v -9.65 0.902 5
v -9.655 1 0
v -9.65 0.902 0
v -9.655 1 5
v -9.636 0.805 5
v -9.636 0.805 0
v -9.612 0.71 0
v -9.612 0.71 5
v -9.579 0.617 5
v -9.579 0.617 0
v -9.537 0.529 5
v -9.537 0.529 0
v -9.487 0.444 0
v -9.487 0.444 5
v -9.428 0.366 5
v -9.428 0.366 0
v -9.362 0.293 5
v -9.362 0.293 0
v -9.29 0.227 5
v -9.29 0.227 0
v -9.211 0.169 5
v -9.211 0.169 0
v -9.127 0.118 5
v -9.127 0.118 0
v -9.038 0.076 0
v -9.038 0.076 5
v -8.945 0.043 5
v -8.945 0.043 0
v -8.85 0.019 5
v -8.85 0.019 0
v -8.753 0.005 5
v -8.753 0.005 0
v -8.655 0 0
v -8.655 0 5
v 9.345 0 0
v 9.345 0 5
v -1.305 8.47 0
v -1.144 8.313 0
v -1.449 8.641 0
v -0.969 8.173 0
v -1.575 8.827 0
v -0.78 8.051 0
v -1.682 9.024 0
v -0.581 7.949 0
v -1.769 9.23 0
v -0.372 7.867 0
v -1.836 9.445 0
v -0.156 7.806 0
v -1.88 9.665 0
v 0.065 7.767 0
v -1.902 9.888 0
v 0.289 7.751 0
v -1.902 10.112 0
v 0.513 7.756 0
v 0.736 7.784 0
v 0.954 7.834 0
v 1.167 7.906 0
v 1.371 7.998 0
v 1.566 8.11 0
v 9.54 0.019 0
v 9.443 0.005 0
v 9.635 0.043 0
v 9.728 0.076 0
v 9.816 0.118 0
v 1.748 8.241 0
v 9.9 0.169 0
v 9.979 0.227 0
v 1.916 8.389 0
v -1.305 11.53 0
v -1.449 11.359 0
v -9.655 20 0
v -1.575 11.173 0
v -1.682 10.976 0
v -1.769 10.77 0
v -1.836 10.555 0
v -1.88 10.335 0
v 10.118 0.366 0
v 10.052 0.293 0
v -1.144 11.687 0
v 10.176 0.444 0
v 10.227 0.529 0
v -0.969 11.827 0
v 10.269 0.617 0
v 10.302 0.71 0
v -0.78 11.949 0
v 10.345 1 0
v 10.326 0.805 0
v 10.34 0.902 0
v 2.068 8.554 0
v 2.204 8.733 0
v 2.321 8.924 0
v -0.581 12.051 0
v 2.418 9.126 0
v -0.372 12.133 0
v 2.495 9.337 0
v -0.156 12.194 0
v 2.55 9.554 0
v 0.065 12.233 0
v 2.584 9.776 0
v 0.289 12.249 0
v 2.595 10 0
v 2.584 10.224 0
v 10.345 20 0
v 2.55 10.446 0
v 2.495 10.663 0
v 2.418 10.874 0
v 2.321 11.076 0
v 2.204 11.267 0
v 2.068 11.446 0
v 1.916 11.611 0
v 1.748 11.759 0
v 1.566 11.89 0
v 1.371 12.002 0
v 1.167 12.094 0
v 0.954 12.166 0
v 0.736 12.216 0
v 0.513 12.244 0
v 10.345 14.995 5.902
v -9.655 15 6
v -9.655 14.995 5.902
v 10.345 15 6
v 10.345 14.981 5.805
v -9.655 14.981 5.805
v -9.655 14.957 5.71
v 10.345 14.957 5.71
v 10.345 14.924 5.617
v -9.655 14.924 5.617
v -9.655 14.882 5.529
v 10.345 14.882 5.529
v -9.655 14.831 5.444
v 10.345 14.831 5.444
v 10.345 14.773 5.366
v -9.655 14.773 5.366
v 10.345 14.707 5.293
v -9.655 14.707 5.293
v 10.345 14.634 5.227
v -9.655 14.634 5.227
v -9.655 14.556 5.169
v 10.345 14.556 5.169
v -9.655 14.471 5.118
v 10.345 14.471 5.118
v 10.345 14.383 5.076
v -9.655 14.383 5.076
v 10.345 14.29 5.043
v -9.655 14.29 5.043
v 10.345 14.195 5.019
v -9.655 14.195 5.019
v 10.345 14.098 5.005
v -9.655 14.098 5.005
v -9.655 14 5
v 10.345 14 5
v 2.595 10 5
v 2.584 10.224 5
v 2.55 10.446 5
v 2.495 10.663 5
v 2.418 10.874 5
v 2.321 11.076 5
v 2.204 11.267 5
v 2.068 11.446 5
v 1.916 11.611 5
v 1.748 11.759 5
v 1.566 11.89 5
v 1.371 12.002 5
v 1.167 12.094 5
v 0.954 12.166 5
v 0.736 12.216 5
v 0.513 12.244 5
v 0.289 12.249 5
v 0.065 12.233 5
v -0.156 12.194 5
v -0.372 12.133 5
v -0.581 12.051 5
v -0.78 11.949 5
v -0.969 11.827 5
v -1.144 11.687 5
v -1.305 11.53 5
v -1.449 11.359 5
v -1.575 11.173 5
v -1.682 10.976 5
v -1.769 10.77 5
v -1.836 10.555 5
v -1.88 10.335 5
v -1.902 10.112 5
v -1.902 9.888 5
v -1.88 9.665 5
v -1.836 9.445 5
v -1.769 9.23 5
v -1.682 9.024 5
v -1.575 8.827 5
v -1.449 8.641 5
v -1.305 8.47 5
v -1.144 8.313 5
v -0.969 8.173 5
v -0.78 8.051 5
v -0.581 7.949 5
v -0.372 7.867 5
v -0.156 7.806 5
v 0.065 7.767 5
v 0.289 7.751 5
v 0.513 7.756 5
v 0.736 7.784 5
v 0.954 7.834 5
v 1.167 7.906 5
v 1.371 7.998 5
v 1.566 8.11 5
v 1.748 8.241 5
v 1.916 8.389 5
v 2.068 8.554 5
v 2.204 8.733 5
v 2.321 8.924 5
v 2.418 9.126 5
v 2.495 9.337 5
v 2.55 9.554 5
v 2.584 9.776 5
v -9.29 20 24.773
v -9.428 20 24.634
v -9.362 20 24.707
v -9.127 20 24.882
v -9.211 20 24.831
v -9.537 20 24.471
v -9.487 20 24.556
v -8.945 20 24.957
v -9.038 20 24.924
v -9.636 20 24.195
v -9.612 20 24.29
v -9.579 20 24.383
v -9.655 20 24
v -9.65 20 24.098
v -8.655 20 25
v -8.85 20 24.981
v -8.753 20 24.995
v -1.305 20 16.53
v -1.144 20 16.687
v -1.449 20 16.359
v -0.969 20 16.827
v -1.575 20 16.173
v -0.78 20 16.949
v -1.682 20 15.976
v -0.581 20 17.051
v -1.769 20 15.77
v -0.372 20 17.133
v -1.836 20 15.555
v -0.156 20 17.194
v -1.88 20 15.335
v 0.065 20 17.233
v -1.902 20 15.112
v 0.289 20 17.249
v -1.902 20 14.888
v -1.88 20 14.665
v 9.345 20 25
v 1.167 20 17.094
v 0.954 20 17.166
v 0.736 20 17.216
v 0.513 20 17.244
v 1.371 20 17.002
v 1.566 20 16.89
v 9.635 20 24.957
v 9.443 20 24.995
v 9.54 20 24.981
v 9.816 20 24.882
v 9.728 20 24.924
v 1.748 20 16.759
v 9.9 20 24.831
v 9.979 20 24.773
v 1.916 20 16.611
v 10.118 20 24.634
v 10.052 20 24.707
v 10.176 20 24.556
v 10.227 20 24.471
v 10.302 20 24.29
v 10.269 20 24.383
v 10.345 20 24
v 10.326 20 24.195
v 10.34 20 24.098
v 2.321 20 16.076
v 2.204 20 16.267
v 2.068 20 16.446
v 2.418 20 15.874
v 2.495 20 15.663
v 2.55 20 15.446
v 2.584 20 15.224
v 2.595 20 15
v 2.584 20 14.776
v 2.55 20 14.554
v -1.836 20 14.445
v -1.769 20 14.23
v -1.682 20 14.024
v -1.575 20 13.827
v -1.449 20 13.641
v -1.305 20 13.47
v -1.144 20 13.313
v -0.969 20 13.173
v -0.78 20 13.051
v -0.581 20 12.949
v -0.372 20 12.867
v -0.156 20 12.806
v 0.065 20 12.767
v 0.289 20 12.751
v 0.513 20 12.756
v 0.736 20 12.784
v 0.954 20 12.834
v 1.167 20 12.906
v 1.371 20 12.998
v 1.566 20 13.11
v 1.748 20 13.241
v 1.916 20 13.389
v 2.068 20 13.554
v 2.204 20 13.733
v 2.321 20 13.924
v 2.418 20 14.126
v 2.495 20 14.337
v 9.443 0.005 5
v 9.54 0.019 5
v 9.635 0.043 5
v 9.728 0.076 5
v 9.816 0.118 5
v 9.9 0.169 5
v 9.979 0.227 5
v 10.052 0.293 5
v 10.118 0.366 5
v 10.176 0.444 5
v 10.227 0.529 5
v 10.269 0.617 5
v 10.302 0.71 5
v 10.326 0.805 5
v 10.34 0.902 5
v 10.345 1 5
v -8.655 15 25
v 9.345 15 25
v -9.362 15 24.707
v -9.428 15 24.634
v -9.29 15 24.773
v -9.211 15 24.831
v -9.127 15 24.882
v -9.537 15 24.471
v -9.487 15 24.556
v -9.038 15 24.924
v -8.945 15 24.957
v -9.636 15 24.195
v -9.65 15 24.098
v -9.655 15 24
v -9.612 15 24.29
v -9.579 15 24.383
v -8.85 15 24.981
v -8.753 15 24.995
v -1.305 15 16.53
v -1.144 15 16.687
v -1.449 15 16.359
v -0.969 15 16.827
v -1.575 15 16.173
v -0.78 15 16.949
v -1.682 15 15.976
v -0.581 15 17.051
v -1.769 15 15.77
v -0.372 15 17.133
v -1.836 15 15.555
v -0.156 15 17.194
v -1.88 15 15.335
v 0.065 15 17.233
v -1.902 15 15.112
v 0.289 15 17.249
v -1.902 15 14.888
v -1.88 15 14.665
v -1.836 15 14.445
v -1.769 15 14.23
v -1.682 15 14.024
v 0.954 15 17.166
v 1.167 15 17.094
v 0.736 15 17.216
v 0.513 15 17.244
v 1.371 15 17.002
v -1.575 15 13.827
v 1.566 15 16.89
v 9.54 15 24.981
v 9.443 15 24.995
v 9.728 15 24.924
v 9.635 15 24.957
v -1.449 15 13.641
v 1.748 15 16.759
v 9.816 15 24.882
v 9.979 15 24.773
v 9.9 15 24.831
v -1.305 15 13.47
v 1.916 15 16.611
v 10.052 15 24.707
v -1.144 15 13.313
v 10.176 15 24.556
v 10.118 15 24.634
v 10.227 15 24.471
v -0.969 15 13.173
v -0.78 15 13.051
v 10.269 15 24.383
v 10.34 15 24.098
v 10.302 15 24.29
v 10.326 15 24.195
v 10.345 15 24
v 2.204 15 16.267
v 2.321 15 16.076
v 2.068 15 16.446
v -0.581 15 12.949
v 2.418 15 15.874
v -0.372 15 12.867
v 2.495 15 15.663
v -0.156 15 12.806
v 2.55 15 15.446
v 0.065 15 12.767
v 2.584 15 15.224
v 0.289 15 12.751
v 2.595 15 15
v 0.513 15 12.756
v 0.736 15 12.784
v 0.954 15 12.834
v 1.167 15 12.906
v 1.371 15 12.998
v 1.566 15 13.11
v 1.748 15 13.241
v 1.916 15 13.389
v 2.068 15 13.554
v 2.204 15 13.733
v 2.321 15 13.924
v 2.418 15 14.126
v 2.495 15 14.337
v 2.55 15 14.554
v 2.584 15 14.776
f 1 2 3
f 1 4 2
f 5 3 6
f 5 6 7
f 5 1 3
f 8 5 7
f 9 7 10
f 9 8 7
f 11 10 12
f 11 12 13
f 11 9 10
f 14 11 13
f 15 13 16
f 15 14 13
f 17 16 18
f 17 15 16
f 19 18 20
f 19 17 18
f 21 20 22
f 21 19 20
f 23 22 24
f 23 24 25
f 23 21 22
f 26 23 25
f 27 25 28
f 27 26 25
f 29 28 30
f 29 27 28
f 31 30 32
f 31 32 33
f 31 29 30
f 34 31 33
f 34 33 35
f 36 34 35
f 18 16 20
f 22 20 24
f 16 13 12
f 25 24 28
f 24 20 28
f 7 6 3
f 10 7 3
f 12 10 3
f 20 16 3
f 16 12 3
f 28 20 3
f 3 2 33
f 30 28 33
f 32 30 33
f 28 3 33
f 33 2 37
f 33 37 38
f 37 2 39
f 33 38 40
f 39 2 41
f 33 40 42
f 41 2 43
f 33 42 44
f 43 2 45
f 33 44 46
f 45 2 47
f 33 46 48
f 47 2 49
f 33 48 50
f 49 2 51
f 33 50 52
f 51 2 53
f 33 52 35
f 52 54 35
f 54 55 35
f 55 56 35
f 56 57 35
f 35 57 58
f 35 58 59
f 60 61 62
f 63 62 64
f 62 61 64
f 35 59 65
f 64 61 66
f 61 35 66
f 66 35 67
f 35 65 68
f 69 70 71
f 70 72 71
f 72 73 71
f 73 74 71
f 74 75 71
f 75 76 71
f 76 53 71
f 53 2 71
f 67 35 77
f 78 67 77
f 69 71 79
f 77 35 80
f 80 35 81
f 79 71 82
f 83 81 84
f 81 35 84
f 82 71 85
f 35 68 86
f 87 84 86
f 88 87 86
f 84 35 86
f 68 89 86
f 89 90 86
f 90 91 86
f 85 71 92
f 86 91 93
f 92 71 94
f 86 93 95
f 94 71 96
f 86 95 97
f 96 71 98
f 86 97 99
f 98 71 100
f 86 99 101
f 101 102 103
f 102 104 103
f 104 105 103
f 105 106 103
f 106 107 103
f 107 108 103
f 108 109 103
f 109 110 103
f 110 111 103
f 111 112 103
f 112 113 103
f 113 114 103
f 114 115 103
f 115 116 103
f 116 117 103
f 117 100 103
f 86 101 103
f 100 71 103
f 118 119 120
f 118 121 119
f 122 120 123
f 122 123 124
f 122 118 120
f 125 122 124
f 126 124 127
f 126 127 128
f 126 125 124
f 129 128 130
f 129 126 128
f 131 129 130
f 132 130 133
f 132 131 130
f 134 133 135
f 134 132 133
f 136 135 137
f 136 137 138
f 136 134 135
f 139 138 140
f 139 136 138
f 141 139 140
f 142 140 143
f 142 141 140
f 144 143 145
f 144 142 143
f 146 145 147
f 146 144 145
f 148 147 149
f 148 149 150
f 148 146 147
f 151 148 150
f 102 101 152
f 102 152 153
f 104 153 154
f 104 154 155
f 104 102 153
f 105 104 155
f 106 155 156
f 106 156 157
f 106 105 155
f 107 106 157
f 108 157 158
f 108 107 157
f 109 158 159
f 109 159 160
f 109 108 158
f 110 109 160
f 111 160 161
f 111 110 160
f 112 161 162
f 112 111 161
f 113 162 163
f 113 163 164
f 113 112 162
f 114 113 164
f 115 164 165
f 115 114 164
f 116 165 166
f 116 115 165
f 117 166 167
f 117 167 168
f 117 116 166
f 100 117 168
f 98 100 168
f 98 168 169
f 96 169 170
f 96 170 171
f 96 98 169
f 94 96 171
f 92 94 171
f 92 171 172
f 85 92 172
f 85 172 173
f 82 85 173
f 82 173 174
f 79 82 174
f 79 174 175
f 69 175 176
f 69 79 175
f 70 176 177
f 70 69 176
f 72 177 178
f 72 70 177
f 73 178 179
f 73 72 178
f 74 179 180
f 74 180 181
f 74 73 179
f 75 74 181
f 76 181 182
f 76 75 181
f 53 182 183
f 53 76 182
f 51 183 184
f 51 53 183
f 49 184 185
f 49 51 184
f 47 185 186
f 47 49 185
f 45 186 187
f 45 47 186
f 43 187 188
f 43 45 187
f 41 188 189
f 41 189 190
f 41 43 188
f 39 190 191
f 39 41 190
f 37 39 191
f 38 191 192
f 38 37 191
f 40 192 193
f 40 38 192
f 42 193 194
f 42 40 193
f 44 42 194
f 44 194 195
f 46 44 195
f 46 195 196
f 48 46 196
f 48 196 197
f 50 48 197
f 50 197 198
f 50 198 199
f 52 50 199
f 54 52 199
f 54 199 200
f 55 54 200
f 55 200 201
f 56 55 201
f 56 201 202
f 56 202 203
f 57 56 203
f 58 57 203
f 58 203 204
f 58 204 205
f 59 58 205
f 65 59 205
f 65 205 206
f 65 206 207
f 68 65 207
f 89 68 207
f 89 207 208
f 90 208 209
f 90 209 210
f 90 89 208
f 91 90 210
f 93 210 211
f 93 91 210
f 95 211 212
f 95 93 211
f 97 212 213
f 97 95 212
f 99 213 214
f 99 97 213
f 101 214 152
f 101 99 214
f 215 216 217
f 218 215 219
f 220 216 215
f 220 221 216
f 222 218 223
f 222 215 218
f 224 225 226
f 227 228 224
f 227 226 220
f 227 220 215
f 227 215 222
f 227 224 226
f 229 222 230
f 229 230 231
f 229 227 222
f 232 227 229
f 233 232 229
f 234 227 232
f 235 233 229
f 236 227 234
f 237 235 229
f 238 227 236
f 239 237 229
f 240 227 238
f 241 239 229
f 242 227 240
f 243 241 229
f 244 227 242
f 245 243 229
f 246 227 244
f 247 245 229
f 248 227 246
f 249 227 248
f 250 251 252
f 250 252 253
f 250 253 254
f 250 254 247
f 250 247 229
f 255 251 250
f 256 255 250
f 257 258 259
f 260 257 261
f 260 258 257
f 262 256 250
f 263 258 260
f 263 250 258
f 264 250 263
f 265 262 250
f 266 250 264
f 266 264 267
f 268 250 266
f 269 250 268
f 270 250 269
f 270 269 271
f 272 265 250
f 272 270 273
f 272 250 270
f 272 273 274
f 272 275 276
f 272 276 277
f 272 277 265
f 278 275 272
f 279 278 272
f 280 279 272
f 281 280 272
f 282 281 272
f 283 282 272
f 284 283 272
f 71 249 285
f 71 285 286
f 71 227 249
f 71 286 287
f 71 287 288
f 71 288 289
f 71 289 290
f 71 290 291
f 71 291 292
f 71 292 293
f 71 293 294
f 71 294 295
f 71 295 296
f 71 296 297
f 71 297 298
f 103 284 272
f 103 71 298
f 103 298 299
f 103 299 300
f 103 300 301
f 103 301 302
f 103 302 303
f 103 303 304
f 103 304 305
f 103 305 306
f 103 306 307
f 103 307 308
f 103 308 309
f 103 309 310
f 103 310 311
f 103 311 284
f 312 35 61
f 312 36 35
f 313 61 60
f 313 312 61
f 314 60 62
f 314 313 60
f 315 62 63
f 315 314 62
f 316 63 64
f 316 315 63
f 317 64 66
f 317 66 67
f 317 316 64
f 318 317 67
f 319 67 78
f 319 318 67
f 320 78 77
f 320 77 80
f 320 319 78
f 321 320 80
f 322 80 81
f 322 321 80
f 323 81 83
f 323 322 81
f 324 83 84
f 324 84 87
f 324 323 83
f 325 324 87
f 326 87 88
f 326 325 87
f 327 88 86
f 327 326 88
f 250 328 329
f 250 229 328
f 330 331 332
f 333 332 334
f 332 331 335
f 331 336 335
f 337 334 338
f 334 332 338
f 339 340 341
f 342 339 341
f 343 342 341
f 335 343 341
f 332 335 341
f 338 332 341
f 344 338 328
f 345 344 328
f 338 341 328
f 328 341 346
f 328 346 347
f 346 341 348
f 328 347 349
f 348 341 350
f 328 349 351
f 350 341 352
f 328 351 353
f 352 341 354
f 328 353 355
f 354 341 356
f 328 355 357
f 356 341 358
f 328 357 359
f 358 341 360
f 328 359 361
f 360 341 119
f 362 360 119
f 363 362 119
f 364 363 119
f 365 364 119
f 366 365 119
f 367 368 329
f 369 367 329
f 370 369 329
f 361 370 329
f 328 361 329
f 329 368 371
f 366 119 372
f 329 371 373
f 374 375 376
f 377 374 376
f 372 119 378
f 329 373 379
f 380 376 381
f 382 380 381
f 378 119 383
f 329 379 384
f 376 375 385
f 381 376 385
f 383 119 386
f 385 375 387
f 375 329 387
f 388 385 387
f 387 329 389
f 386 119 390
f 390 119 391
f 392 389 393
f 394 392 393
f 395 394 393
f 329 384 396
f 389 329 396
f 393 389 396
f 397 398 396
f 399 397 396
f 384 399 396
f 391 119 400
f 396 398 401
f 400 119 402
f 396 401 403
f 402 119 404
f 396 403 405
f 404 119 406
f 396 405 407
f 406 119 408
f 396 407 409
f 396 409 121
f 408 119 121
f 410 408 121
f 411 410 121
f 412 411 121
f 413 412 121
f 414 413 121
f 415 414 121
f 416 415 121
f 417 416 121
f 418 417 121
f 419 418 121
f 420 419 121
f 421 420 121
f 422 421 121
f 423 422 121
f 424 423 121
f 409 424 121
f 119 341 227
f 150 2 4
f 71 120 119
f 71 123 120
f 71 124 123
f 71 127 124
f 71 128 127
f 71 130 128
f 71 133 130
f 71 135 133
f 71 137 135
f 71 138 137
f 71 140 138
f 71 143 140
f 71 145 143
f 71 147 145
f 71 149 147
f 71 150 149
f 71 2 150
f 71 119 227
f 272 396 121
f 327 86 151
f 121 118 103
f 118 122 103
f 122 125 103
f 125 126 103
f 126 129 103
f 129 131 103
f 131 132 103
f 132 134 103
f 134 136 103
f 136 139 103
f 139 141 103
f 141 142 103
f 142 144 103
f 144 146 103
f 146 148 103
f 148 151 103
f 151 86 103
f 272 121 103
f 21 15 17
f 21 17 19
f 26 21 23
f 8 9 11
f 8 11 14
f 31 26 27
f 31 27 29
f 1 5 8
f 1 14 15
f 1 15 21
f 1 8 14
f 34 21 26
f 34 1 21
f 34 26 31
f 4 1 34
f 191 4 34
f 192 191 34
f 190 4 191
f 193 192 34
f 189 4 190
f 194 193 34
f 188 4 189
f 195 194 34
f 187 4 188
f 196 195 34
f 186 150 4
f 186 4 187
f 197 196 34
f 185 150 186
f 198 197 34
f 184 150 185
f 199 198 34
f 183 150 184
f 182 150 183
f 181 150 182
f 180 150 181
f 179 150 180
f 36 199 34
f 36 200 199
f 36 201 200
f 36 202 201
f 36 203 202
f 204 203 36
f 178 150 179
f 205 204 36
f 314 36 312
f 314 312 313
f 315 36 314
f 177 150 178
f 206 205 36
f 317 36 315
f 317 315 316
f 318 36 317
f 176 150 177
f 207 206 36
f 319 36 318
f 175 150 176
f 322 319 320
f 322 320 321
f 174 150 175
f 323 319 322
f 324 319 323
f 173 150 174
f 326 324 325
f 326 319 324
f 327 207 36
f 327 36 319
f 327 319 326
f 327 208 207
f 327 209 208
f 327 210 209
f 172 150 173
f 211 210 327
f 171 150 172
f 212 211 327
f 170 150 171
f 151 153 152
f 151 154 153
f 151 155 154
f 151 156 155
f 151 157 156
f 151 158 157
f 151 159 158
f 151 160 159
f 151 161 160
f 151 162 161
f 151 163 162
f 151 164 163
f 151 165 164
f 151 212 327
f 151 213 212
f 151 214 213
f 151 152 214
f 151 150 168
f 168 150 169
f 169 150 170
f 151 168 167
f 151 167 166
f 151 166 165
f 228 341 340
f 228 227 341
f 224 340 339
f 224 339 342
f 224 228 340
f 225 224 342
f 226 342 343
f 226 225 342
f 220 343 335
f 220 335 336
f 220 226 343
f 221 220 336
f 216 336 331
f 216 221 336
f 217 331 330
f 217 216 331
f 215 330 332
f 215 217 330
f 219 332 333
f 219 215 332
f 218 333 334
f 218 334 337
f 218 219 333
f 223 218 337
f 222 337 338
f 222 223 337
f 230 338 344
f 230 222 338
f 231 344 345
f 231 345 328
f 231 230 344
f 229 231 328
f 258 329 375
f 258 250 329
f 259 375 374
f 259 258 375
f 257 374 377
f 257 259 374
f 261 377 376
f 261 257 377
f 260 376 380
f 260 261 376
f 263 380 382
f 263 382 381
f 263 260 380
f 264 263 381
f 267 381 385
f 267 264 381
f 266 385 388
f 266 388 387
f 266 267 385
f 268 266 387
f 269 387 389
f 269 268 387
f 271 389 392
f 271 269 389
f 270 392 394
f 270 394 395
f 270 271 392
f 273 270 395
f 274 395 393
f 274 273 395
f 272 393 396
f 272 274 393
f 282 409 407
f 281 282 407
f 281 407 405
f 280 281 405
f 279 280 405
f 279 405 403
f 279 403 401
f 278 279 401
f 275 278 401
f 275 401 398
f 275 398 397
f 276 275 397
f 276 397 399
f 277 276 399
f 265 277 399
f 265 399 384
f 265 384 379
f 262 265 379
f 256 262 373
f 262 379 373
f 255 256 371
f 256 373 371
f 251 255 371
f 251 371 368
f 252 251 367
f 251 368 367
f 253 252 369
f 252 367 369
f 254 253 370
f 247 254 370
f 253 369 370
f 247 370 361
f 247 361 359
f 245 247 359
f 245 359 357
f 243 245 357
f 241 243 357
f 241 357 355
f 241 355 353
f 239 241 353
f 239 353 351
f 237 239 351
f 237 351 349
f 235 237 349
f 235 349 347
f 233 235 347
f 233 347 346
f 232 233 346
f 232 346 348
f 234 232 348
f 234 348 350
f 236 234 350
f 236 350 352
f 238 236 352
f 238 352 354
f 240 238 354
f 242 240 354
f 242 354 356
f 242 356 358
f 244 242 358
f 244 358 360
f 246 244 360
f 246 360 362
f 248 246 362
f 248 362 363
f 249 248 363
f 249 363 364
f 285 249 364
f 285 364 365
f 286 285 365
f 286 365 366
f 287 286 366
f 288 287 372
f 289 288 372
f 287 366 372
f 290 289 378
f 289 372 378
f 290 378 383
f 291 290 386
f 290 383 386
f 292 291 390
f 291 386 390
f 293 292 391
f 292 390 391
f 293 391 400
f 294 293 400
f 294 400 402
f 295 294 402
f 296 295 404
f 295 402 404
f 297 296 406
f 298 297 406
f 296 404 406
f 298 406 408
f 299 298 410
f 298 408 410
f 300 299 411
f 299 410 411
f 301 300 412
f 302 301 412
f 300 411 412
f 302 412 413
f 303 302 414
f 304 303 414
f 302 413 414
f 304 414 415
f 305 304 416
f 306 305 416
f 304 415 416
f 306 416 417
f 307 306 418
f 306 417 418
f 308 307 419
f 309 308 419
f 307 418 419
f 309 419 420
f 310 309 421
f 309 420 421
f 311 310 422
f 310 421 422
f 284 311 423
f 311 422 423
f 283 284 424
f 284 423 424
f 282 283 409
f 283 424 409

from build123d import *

# Parameters (mm, degrees)
F0_W     = 20
F0_H     = 15
F0_R     = 2.25
F1_DEPTH = 5
F0_H_2   = 5
F2_DEPTH = 25
F3_R     = 2.25
F4_DEPTH = 25
F5_R     = 1


with BuildPart() as f1:
    # F0 (on Top) → F1 (new body)
    with BuildSketch(Plane.XY):
        with Locations((0.344828, 7.5)):
            Rectangle(F0_W, F0_H)
        with Locations((0.344828, 10)):
            Circle(F0_R, mode=Mode.SUBTRACT)
    extrude(amount=F1_DEPTH)

    # F0 (on Top) → F2 (join)
    with BuildSketch(Plane.XY):
        with Locations((0.344828, 17.5)):
            Rectangle(F0_W, F0_H_2)
    extrude(amount=F2_DEPTH)

    # F3 (on face) → F4 (cut)
    with BuildSketch(Plane.XZ.offset(-15)):
        with Locations((0.344828, 15)):
            Circle(F3_R)
    extrude(amount=-F4_DEPTH, mode=Mode.SUBTRACT)

    # F5
    f5_edges = [f1.edges().sort_by_distance(p)[0] for p in [
        (-9.655172, 17.5, 25),
        (10.344828, 17.5, 25),
        (-9.655172, 0, 2.5),
        (10.344828, 0, 2.5),
        (0.344828, 15, 5),
    ]]
    fillet(f5_edges, radius=F5_R)


solid = f1.part
